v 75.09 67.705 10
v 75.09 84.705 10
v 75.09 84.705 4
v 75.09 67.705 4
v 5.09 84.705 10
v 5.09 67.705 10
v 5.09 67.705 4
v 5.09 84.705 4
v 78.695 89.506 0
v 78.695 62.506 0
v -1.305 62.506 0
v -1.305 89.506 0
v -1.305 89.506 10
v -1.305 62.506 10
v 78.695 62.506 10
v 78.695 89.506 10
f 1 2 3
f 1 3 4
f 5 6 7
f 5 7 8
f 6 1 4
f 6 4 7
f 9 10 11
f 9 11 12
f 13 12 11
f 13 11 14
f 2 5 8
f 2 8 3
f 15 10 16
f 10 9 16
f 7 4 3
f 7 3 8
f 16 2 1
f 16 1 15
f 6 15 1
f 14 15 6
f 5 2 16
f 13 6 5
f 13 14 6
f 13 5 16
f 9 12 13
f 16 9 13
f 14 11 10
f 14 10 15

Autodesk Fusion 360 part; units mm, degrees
box "BoxPrimitive2" add length 27 width 80 height 10 placed x (0, 1, 0) y (-1, 0, 0) z (0, 0, 1) at (78.6953, 62.5055, 0)
sketch "Sketch3" plane through (0, 0, 10) normal (0, 0, 1) x (-1, 0, 0)
  line L0 (-78.6953, -89.5055) -> (1.3047, -89.5055)
  line L1 (1.3047, -89.5055) -> (1.3047, -62.5055)
  line L2 (1.3047, -62.5055) -> (-78.6953, -62.5055)
  line L3 (-78.6953, -62.5055) -> (-78.6953, -89.5055)
  line L4 (-5.0904, -84.7047) -> (-75.0904, -84.7047)
  line L5 (-75.0904, -84.7047) -> (-75.0904, -67.7047)
  line L6 (-75.0904, -67.7047) -> (-5.0904, -67.7047)
  line L7 (-5.0904, -67.7047) -> (-5.0904, -84.7047)
  dimension "d16" = 70
  dimension "d17" = 17
extrude "Extrude1" cut sketch "Sketch3" against normal blind 6 contours L4 L5 L6 L7
